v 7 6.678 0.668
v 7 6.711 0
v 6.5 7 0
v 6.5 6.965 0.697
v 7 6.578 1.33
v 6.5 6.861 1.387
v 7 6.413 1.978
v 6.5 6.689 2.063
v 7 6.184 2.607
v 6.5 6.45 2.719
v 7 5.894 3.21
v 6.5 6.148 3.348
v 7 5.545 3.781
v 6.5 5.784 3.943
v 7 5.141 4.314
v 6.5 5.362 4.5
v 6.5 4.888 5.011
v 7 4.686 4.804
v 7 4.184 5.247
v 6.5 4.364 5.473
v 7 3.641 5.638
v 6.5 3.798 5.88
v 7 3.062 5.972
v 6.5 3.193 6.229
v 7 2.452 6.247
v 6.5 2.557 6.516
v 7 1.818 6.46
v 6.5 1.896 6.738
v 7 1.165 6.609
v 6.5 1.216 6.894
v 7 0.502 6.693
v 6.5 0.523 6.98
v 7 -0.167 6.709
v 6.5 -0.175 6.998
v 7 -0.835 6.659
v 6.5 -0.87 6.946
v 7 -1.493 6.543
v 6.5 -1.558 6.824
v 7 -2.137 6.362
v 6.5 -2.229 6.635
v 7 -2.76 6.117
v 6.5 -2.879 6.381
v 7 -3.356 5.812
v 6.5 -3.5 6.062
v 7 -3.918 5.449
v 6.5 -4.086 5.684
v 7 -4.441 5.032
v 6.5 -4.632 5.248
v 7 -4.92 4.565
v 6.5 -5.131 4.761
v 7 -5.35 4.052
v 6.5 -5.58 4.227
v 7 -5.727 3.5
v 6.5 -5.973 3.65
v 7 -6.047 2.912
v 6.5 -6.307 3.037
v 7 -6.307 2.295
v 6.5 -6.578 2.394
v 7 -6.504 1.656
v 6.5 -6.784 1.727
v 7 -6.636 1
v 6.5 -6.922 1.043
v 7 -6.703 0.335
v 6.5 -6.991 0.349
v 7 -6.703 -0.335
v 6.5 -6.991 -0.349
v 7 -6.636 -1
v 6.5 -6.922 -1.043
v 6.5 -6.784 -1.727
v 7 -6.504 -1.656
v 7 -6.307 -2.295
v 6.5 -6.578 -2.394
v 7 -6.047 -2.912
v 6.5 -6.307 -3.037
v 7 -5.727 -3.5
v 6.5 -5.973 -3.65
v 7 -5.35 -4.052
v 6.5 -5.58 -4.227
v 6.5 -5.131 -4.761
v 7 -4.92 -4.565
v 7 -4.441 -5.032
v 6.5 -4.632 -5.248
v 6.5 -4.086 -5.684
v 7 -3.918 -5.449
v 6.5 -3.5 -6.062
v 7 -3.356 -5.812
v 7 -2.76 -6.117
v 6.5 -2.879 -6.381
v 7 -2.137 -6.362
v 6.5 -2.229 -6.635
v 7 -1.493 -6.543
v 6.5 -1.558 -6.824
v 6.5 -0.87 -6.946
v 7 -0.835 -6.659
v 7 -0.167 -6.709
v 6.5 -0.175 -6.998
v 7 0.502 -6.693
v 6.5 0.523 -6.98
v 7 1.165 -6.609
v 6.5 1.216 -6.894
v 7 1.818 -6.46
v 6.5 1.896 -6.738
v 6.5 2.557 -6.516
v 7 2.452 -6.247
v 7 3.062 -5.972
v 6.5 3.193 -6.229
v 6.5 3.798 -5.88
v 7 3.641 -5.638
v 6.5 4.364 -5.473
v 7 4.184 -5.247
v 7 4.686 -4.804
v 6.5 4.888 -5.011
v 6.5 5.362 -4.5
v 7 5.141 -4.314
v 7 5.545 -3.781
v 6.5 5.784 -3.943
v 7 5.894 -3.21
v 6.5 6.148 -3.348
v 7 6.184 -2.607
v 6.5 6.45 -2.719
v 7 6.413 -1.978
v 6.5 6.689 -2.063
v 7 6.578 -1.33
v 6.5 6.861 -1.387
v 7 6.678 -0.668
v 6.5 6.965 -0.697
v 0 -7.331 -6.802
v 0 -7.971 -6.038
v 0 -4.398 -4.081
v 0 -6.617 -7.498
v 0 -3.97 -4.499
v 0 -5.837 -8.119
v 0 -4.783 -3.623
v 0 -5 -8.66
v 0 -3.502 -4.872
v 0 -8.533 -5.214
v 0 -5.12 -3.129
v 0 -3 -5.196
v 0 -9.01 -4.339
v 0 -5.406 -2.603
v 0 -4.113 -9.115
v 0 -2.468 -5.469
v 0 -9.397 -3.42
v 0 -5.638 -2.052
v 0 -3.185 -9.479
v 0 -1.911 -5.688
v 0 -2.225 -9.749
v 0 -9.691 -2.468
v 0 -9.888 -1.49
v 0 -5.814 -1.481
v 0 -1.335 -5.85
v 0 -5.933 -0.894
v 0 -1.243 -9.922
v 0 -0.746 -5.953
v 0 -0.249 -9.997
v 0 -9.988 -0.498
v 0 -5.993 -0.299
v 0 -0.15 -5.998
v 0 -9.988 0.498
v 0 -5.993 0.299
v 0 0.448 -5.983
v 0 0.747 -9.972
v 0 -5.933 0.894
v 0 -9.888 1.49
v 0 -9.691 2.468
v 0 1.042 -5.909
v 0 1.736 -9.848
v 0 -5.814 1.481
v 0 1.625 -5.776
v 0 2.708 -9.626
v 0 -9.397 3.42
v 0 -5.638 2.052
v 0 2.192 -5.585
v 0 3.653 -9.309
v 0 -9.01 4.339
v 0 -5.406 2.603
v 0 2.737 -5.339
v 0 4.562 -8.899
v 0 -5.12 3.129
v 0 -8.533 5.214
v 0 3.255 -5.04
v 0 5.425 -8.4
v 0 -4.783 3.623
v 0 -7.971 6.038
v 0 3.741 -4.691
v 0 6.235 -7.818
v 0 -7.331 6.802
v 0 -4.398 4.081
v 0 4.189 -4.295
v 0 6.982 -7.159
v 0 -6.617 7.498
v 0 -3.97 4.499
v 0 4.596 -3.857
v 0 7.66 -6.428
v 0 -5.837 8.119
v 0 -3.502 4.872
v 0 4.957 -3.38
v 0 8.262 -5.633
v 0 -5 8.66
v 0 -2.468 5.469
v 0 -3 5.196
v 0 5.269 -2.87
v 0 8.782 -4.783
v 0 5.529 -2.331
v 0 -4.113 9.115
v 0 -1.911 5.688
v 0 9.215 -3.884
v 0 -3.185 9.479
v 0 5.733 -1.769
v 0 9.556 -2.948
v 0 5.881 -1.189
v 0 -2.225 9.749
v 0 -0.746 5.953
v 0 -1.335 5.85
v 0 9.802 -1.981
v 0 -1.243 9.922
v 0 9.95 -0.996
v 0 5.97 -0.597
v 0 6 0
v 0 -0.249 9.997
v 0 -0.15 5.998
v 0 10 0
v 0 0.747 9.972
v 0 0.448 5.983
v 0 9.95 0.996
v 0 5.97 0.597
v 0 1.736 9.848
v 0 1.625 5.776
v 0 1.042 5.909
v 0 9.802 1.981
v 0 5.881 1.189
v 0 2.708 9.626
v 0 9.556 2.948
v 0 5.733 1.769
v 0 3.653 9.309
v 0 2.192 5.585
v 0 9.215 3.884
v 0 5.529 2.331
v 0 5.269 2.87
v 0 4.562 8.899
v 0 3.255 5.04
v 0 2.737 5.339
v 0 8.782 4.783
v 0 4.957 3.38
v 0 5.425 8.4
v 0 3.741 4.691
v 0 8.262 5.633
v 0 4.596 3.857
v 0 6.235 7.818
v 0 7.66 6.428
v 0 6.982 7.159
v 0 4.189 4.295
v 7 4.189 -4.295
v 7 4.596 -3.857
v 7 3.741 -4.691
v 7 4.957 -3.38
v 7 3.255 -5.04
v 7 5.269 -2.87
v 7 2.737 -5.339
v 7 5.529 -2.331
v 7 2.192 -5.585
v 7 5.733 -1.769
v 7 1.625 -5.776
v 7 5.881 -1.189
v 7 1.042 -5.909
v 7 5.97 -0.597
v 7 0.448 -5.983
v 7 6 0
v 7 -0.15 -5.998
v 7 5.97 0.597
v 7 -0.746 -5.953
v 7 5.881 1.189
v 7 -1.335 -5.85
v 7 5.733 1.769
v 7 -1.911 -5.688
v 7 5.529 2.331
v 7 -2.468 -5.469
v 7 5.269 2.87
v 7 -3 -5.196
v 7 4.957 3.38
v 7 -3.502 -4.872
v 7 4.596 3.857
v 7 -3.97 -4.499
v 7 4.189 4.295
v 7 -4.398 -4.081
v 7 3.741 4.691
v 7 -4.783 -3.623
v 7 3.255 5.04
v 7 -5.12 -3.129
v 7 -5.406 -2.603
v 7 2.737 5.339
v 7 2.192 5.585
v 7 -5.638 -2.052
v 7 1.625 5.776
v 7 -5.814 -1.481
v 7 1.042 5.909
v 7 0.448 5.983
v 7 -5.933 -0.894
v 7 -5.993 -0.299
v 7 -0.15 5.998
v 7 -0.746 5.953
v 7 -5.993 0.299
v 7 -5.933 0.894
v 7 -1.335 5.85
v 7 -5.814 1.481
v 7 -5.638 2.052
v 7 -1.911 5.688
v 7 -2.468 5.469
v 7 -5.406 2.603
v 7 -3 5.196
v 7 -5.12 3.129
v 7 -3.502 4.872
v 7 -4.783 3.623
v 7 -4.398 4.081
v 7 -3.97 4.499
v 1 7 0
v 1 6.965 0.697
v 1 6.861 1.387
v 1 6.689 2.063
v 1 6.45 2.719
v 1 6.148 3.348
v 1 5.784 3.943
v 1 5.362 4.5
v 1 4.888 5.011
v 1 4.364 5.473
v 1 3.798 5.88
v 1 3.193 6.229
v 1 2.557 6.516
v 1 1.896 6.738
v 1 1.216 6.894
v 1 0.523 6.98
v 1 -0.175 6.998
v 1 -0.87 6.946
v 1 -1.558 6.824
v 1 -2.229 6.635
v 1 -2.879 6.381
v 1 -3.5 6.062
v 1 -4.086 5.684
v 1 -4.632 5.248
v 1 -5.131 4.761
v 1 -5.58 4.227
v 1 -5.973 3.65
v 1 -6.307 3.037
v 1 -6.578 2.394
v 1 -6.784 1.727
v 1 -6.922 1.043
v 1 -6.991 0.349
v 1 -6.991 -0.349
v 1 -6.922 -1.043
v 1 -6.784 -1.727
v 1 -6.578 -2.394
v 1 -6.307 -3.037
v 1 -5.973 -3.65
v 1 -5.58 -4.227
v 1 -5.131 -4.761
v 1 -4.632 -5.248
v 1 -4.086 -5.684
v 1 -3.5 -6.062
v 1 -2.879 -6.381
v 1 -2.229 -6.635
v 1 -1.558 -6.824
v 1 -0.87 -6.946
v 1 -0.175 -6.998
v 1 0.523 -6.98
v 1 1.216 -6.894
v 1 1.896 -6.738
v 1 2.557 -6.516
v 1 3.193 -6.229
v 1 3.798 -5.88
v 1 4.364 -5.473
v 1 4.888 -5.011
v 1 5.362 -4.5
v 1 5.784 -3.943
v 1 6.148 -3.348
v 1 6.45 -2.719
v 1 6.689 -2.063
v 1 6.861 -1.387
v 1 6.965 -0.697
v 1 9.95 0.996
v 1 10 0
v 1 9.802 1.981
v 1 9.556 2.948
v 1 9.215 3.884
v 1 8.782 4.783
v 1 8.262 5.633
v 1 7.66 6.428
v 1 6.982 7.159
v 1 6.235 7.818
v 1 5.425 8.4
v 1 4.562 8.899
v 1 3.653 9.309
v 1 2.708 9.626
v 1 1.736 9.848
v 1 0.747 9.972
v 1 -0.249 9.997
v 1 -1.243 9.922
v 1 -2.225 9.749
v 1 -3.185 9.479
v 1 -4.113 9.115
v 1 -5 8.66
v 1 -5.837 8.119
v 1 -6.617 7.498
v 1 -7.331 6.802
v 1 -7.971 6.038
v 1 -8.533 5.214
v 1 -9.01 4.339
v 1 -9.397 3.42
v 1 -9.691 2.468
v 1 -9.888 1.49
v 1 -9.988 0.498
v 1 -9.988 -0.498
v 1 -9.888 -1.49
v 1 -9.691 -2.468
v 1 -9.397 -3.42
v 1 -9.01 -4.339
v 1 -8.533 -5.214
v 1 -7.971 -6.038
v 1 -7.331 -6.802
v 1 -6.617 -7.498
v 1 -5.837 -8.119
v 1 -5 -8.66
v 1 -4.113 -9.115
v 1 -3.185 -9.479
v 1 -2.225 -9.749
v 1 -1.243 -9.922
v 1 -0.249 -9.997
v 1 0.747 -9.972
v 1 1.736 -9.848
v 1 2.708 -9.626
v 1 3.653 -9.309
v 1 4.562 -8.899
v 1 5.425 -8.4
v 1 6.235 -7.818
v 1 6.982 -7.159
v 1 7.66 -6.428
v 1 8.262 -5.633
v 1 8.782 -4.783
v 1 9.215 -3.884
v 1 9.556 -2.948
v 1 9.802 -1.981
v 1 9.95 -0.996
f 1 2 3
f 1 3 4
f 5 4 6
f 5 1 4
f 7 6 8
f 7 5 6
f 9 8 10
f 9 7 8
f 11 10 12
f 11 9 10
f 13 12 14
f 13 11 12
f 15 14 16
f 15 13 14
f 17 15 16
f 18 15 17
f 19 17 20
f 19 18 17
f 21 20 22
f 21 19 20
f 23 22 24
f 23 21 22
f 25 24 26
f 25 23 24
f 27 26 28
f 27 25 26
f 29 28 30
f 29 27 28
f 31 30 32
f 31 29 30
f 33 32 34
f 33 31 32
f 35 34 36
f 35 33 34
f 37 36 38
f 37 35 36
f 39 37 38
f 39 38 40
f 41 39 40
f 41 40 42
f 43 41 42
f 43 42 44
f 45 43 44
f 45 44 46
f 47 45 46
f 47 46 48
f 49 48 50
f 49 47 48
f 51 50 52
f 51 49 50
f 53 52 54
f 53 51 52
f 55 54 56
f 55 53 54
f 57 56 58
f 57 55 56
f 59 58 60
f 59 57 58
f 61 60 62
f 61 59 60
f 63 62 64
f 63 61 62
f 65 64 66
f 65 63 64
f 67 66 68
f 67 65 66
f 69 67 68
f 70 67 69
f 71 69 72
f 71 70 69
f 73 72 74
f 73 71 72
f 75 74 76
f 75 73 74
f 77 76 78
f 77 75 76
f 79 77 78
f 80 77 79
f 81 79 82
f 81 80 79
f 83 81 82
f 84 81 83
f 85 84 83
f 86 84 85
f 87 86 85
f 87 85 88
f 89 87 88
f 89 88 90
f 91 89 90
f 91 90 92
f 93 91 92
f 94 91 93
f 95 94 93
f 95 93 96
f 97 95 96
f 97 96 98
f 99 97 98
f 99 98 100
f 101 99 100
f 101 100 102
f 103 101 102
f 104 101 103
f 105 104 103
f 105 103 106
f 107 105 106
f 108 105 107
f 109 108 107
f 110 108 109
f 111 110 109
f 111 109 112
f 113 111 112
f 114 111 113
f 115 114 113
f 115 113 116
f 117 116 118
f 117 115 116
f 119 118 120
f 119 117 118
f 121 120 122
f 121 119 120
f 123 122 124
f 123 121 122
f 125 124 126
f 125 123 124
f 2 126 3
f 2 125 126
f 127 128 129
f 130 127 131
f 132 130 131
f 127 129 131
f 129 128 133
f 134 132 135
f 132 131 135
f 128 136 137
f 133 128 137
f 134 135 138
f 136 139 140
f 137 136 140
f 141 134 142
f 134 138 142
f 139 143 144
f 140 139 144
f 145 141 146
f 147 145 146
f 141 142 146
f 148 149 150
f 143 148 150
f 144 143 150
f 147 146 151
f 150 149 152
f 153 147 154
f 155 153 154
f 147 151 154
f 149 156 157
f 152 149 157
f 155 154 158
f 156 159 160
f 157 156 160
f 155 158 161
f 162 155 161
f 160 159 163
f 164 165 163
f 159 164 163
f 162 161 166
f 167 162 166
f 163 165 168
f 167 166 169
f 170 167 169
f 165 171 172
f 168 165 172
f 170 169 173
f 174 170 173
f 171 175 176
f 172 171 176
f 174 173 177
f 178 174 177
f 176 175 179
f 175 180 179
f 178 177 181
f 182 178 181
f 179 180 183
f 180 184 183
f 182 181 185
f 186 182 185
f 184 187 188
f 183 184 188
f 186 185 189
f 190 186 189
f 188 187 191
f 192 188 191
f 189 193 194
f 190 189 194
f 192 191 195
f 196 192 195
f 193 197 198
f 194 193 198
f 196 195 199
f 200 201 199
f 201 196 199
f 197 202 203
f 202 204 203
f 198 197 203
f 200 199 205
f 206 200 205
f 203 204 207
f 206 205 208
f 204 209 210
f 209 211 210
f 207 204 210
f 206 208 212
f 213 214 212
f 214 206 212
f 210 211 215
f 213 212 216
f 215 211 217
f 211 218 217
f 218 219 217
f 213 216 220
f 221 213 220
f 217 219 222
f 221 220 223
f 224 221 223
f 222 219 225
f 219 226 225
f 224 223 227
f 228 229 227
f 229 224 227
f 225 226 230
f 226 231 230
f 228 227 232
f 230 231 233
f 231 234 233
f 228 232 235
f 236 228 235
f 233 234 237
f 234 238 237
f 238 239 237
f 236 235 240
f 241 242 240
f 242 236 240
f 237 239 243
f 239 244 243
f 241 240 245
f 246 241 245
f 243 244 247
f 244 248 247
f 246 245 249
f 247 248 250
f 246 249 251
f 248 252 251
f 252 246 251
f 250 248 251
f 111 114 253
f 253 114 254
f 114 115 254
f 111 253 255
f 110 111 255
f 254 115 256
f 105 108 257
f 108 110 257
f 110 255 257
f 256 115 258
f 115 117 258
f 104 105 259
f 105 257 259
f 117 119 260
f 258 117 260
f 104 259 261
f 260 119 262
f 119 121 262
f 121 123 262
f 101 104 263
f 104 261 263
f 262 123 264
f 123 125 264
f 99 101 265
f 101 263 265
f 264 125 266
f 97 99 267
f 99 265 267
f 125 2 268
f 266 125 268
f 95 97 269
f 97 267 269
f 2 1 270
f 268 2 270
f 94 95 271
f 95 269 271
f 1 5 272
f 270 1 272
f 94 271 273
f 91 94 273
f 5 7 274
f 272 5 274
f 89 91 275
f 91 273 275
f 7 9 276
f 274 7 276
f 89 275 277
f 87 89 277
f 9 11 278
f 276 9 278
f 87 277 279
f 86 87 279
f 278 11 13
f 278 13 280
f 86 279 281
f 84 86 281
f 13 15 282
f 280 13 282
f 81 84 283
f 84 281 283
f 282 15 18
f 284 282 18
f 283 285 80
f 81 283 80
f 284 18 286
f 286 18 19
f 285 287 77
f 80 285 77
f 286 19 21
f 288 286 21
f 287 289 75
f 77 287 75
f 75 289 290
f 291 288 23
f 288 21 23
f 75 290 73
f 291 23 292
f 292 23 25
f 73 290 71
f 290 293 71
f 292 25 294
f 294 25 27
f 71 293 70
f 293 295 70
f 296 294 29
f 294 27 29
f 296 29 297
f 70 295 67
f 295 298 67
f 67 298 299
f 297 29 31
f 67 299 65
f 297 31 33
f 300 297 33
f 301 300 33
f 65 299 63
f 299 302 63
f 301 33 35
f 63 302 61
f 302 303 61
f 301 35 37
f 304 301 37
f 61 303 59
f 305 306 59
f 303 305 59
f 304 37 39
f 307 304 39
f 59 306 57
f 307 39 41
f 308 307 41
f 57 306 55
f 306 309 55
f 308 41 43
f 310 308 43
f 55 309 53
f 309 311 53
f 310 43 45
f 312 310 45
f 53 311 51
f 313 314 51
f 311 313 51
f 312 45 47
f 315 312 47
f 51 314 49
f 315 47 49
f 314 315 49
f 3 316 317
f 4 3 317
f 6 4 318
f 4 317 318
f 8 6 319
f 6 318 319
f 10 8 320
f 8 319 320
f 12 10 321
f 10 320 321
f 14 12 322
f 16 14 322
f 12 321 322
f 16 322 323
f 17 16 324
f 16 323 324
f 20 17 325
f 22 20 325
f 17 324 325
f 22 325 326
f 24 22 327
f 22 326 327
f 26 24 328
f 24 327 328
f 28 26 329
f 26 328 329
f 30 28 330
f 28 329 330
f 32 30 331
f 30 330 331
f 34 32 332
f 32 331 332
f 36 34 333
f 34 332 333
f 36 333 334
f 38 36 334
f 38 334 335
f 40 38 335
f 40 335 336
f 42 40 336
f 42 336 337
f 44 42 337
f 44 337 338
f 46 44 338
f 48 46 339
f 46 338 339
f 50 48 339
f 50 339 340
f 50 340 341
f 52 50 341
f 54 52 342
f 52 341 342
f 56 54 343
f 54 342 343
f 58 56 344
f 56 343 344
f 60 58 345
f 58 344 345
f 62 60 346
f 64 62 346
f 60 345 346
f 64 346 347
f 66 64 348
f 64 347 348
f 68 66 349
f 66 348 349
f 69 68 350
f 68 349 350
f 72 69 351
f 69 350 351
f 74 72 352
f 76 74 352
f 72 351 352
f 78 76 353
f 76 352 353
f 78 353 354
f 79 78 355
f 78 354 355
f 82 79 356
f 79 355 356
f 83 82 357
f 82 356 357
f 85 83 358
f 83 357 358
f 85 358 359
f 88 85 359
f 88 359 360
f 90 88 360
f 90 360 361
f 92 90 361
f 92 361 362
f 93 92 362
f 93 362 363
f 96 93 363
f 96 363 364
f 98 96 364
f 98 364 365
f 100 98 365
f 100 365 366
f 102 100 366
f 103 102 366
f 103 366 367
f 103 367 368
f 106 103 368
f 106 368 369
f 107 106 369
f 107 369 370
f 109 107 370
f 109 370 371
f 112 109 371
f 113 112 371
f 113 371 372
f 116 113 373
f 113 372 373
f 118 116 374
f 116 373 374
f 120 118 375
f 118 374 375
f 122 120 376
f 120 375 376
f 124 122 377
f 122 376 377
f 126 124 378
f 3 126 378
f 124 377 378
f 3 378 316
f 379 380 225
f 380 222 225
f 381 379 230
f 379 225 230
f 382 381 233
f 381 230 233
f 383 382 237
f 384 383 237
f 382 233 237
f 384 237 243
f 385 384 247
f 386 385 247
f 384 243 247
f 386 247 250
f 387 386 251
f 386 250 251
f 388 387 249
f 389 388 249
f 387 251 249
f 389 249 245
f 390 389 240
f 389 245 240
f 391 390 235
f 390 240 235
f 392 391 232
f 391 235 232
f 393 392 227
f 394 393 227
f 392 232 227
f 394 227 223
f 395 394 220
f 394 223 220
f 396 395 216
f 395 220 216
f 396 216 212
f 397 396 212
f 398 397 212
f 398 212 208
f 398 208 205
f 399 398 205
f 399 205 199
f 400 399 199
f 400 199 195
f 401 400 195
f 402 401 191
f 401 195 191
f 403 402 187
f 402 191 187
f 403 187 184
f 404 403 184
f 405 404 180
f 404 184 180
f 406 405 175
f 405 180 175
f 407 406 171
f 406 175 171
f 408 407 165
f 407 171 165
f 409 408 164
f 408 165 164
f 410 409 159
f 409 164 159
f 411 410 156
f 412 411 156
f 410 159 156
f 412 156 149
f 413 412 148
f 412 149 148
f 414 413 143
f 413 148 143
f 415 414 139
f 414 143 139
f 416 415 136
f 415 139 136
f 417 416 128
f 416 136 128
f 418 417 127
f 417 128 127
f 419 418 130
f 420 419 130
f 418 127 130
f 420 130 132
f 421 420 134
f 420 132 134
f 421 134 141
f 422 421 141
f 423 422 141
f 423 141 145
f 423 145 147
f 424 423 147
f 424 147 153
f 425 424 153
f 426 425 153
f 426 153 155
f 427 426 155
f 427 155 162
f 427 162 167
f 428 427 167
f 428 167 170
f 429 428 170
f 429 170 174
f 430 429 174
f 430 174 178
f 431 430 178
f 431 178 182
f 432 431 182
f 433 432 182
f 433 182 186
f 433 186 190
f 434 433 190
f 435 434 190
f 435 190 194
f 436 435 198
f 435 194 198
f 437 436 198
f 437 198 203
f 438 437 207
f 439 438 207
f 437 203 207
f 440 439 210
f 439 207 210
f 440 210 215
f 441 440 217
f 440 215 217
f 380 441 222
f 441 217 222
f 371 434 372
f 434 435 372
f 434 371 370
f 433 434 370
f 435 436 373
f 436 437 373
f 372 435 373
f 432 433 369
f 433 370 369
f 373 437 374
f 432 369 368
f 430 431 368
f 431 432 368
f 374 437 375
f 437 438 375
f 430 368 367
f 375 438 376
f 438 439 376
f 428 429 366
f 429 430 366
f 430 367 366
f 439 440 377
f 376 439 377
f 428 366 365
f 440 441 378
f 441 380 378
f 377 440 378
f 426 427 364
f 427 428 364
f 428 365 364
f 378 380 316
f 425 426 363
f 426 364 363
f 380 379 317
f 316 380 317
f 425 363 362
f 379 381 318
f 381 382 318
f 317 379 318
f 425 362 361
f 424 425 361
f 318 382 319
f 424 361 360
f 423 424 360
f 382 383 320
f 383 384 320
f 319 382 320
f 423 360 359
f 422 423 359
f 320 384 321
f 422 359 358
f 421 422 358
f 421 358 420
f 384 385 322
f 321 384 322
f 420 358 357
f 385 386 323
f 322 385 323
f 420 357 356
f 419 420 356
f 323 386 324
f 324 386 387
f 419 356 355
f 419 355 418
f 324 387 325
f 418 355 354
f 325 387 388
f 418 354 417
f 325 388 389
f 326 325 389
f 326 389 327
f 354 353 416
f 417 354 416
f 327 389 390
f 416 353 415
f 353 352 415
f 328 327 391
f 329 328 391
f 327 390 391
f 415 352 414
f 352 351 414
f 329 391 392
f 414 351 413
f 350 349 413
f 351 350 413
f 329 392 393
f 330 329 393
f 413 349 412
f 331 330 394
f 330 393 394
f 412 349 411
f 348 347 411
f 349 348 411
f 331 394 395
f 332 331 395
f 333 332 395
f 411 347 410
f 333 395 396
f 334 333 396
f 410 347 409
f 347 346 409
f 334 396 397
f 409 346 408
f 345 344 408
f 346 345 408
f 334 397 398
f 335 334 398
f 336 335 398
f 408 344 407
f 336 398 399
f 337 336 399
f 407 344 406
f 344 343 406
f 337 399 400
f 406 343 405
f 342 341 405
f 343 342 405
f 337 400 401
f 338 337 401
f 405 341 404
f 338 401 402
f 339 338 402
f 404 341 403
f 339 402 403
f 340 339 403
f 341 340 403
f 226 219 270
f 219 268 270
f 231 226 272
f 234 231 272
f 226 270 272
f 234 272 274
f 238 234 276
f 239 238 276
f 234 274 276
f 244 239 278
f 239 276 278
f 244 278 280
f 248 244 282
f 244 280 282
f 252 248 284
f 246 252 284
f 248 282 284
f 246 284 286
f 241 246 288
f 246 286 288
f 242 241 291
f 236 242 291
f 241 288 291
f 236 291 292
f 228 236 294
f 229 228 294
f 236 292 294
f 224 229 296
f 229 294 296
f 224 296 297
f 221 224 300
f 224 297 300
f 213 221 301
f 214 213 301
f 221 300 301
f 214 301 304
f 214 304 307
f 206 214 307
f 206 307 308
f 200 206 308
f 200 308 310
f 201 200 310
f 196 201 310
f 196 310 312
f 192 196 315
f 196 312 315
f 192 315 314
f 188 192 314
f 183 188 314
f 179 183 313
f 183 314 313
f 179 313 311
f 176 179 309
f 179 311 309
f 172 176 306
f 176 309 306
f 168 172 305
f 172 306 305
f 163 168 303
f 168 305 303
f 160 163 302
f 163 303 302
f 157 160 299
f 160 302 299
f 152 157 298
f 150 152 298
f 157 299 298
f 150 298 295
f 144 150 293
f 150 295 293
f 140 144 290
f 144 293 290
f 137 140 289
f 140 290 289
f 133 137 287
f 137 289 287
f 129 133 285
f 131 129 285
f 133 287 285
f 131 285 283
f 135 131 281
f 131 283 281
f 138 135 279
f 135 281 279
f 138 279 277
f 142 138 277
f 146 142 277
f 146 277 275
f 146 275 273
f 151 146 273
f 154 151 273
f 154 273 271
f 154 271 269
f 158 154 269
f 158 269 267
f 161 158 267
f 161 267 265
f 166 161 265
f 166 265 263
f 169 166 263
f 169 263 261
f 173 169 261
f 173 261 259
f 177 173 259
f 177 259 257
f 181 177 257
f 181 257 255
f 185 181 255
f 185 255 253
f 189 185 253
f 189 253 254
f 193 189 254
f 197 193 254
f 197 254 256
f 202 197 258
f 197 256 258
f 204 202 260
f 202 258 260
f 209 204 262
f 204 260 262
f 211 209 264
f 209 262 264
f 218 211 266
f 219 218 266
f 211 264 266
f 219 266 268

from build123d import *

# Parameters (mm, degrees)
SFAZOWANIE1_SIZE  = 0.5
SFAZOWANIE1_SIZE2 = 0.288675135


with BuildPart() as part:
    # Szkic1 → Obrót1 (revolve)
    with BuildSketch(Plane.XY):
        Polygon((0, 6), (7, 6), (7, 7), (1, 7), (1, 10), (0, 10), align=None)
    revolve(axis=Axis((0, 0, 0), (1, 0, 0)))

    # Sfazowanie1
    sfazowanie1_edges = [part.edges().sort_by_distance(p)[0] for p in [
        (7, -7, 0),
    ]]
    sfazowanie1_side = [part.faces().sort_by_distance(p)[0] for p in [
        (4, -7, 0),
    ]]
    chamfer(sfazowanie1_edges, length=SFAZOWANIE1_SIZE, length2=SFAZOWANIE1_SIZE2, reference=sfazowanie1_side[0])


solid = part.part
